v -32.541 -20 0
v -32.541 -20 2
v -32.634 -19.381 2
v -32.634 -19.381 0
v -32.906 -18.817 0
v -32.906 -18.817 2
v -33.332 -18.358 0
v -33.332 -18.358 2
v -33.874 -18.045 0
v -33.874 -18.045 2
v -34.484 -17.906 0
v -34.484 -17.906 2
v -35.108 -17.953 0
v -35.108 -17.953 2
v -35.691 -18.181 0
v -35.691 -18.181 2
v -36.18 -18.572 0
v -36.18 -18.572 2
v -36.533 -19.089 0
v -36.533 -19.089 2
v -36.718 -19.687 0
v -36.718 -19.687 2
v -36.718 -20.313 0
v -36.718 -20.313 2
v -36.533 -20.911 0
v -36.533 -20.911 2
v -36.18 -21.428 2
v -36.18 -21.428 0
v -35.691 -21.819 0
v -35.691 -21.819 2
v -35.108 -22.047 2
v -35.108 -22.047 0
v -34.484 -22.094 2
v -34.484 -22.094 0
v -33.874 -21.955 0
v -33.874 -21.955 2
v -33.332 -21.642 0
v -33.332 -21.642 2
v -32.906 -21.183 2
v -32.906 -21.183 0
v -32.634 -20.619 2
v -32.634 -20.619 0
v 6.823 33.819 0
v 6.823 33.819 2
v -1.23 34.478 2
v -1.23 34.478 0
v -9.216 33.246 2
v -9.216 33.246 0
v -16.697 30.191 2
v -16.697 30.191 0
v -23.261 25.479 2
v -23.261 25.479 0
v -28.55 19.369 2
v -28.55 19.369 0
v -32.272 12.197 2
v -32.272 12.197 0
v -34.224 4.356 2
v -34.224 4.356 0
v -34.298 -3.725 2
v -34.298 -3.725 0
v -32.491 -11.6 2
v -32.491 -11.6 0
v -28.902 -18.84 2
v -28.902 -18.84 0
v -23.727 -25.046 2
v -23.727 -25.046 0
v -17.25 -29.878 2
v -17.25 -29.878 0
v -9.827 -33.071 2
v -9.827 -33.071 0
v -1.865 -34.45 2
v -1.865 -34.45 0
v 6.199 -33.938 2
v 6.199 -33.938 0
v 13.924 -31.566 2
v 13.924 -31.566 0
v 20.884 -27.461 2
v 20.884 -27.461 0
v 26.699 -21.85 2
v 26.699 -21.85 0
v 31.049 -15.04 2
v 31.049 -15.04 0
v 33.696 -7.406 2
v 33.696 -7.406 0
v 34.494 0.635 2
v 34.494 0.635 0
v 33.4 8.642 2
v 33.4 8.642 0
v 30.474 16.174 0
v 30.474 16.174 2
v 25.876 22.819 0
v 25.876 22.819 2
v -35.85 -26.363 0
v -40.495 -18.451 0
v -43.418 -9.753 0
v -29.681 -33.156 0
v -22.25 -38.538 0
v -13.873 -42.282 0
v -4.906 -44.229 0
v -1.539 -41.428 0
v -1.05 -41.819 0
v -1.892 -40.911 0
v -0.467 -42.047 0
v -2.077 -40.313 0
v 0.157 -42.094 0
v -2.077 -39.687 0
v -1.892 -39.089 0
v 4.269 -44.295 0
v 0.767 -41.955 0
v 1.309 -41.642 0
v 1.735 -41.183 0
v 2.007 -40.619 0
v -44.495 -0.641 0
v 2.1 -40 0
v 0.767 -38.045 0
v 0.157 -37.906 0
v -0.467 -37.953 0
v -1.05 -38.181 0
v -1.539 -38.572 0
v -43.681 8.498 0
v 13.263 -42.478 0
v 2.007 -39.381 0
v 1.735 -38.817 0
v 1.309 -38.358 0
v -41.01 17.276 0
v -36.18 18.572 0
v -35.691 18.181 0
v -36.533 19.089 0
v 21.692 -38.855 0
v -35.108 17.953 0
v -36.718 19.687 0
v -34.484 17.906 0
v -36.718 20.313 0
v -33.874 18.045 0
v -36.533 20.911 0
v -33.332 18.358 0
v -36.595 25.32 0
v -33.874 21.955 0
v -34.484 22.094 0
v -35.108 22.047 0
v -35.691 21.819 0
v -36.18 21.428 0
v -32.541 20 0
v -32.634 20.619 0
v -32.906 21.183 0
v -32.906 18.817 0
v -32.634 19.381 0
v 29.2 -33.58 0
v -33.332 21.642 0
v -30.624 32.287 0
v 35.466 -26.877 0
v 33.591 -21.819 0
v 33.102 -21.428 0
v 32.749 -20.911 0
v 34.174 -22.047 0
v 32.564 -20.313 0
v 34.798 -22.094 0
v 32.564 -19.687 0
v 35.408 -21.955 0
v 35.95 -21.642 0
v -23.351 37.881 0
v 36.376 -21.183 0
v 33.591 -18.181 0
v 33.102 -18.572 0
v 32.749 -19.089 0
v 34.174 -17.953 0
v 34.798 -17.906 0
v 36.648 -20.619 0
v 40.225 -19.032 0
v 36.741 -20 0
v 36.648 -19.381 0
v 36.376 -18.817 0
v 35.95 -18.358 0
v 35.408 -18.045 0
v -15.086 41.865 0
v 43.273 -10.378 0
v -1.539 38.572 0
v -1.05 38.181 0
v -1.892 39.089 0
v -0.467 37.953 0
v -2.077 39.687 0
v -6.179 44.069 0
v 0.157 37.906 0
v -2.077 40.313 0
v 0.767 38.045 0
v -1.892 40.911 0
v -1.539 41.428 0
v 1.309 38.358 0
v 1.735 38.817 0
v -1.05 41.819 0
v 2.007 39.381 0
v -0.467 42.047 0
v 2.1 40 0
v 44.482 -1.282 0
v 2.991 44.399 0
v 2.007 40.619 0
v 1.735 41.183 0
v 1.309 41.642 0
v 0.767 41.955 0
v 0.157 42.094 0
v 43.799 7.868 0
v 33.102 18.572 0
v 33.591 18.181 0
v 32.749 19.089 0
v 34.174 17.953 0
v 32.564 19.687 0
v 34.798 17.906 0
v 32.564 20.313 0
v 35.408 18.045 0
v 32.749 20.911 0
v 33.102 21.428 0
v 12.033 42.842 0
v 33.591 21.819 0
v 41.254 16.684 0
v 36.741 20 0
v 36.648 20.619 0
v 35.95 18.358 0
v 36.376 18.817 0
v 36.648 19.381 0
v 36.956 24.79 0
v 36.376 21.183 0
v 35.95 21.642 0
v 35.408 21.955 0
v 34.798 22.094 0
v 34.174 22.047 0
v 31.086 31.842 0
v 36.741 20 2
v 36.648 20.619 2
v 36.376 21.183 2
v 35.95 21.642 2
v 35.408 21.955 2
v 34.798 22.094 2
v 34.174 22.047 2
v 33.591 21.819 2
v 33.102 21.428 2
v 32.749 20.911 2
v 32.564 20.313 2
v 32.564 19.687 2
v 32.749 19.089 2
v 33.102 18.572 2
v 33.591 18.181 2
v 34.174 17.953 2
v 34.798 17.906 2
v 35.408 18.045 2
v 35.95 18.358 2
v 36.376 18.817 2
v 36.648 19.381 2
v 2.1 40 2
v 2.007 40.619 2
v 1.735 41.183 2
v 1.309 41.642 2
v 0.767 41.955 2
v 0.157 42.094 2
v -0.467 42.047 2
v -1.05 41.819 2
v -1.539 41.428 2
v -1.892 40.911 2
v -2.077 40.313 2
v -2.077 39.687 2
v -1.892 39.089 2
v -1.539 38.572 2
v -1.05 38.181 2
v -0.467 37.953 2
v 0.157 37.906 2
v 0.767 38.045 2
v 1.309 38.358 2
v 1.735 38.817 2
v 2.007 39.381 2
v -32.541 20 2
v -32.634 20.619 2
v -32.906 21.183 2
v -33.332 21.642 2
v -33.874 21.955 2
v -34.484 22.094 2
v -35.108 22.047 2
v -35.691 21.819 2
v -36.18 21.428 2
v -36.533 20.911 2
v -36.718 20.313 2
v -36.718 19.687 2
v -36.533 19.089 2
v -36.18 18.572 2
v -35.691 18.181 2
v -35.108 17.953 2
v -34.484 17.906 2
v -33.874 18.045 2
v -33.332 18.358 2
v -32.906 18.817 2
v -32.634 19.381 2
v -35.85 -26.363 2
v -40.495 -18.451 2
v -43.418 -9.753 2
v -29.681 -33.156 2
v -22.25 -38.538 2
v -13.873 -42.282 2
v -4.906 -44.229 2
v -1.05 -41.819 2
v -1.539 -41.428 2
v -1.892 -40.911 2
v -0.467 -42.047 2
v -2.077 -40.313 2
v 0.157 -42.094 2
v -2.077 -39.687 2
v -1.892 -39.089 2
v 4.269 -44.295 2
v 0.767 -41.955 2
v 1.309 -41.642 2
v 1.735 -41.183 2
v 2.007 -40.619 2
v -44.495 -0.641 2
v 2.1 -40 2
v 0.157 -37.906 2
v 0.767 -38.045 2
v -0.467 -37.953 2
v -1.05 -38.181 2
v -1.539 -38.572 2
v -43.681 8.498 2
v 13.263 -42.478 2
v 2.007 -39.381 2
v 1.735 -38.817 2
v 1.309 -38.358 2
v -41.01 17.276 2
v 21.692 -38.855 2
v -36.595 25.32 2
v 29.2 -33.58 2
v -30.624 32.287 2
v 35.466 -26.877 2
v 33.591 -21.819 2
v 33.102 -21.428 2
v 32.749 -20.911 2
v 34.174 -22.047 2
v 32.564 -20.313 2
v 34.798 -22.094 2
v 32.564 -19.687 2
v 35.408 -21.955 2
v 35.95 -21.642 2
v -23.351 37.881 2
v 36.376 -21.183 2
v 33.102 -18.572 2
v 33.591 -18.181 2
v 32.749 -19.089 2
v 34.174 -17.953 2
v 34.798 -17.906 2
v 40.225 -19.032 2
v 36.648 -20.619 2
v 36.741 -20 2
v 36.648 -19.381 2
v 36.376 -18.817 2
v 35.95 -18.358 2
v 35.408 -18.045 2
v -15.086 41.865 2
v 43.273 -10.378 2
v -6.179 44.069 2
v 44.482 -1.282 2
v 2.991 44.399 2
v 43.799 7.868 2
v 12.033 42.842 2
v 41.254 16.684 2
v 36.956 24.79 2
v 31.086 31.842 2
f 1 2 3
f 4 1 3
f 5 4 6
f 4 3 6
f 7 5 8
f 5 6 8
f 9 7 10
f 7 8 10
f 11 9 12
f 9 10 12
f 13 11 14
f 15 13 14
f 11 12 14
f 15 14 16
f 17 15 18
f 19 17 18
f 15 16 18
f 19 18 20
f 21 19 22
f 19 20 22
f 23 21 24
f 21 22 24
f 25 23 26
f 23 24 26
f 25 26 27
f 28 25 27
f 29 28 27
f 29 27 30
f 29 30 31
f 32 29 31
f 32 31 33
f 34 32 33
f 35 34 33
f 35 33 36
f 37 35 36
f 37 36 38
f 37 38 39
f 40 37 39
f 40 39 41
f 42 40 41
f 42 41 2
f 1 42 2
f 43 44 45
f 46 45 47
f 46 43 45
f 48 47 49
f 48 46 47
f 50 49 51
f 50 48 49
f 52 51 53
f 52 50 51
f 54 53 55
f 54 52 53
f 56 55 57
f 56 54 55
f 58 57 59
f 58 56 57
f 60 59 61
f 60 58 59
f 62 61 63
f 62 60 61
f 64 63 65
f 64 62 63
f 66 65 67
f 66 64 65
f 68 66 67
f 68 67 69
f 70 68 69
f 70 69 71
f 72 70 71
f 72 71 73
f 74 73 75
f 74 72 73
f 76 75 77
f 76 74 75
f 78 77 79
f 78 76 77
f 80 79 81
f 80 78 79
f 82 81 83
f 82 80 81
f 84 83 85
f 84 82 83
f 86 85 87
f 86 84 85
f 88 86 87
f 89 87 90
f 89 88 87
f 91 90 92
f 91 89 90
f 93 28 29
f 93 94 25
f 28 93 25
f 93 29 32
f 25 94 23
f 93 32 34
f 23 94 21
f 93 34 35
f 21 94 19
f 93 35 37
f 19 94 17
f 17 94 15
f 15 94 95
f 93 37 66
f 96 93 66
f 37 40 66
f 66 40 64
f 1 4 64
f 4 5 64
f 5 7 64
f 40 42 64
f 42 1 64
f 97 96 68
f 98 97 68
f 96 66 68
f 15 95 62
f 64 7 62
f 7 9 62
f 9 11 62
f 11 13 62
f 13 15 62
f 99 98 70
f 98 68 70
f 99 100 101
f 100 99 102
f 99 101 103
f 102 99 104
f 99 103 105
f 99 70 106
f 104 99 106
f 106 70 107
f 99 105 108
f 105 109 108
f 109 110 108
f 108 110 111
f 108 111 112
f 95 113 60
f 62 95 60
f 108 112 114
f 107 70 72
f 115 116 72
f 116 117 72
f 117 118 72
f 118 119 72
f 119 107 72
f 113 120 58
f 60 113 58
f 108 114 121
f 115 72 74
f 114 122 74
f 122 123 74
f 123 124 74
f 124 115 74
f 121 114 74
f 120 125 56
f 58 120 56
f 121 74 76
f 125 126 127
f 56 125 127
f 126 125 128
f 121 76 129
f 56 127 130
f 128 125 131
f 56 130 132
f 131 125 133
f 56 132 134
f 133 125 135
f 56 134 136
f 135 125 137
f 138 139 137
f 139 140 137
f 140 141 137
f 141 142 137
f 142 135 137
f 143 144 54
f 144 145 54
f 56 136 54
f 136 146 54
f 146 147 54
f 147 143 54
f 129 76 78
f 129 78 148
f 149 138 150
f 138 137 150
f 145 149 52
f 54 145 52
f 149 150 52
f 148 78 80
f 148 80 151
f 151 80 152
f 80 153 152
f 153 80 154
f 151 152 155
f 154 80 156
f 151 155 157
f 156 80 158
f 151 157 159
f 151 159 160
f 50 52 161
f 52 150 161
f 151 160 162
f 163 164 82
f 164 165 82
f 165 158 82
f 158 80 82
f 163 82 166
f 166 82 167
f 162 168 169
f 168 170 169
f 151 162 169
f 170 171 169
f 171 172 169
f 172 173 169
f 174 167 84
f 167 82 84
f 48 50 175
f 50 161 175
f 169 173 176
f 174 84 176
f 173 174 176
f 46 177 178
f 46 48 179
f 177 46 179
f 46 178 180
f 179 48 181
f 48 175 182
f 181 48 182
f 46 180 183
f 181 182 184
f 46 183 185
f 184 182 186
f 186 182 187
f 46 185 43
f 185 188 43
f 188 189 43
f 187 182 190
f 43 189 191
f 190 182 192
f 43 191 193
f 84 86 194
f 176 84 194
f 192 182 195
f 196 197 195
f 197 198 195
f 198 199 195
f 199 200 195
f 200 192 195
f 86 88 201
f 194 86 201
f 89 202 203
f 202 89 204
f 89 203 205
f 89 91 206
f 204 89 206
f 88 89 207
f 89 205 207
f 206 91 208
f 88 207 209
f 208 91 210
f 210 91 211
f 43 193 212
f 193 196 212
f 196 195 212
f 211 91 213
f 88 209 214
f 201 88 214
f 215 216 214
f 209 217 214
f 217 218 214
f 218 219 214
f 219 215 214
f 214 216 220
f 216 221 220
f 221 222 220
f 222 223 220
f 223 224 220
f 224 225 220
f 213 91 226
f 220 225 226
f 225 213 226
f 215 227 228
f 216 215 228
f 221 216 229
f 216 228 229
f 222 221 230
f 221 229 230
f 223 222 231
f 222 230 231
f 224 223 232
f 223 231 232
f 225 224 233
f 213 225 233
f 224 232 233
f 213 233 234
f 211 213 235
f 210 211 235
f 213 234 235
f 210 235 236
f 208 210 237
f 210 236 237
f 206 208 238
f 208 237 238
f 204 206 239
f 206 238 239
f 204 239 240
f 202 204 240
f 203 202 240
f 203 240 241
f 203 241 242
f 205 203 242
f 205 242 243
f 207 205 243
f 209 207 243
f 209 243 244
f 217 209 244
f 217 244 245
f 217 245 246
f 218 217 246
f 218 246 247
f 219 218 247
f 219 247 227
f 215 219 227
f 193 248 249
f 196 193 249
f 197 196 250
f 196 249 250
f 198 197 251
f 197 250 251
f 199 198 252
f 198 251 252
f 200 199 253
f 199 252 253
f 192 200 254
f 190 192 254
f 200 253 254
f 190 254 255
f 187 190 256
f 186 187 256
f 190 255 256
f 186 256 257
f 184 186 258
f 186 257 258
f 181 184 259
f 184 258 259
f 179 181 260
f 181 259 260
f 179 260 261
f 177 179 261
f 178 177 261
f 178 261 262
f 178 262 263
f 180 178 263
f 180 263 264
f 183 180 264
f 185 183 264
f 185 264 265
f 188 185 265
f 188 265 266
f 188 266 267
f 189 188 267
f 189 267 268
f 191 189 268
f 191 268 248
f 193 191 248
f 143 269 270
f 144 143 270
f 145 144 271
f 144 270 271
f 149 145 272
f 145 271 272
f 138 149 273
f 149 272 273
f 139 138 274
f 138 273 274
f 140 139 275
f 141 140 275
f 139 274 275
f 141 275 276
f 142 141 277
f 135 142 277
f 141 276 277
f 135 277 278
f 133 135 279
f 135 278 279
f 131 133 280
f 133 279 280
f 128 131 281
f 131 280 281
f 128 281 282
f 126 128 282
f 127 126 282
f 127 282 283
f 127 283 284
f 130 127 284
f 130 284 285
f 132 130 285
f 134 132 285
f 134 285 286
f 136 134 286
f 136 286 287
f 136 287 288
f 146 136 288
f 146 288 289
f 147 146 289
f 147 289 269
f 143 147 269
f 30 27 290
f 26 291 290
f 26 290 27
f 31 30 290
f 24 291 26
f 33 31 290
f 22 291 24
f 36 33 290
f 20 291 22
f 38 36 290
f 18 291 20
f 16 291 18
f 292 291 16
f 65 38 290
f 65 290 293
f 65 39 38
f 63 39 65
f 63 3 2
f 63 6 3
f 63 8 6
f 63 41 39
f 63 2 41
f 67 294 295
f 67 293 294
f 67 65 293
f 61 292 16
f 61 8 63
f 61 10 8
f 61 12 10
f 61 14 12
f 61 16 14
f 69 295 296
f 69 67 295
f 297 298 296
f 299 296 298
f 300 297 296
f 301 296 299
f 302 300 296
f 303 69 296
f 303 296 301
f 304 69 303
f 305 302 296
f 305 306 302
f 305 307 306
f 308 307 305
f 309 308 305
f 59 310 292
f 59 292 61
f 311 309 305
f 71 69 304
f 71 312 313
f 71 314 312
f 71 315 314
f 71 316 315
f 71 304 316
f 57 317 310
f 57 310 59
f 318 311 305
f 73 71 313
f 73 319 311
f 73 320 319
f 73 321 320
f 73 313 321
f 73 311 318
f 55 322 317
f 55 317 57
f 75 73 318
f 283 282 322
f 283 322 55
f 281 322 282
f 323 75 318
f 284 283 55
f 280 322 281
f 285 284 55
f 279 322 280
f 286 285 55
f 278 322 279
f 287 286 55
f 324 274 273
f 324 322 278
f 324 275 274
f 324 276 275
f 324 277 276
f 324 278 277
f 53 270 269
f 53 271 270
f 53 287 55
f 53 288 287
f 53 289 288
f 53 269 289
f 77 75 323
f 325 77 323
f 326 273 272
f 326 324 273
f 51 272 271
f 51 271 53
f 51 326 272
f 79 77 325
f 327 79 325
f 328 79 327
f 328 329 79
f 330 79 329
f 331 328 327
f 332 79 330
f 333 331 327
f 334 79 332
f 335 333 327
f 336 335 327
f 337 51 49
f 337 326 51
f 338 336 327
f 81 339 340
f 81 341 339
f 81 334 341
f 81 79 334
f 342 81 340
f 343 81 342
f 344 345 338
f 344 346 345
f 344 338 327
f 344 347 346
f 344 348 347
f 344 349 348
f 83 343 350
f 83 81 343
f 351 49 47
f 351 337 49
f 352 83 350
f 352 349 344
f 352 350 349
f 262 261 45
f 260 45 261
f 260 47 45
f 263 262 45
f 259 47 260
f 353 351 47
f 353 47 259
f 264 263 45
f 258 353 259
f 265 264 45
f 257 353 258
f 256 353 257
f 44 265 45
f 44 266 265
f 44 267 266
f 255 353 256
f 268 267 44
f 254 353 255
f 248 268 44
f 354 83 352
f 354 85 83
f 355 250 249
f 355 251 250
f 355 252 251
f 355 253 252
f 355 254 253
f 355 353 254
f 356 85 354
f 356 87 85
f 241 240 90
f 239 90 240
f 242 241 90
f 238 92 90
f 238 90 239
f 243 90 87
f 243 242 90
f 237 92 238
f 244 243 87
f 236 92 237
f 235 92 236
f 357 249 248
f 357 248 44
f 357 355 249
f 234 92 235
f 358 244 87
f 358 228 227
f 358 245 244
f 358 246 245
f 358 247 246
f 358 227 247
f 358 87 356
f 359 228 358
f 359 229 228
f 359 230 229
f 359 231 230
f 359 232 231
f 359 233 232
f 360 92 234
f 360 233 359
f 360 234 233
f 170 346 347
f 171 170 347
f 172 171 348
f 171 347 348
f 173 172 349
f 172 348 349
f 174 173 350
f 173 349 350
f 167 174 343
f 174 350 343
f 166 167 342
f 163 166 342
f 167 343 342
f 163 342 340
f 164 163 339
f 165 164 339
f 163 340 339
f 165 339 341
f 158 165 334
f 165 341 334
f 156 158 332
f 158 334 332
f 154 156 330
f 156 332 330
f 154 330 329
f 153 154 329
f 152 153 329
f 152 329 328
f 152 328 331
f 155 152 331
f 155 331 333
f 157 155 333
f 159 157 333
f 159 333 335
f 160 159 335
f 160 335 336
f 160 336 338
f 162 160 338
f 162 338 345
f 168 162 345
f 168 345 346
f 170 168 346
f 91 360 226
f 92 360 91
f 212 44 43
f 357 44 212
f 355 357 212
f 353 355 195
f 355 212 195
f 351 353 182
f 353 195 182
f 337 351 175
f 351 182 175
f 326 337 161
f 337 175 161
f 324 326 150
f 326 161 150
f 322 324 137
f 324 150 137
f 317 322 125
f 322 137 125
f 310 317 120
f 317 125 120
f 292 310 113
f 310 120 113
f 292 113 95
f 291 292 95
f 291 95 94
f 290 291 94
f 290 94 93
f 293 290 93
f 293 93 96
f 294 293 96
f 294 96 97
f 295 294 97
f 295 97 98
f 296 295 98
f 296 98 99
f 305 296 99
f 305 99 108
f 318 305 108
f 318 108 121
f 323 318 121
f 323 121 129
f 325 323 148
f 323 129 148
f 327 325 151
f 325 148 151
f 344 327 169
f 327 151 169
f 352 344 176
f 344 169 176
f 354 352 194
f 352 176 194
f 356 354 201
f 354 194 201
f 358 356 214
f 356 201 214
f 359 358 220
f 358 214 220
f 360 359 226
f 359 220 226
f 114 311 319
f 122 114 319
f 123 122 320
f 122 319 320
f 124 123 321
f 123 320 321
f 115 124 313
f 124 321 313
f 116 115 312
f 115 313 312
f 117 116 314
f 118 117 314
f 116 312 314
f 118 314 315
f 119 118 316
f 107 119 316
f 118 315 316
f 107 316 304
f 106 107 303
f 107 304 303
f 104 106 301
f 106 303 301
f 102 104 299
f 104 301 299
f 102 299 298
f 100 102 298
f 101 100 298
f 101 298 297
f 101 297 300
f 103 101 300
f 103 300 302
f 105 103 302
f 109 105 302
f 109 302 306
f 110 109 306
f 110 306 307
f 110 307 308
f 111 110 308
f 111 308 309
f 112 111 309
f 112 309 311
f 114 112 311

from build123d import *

# Parameters (mm, degrees)
SKETCH_1_R          = 44.5
SKETCH_1_R_2        = 34.5
EXTRUDE_1_DEPTH     = 2
SKETCH_2_R          = 2.1
CUT_EXTRUDE_1_DEPTH = 26
CUT_EXTRUDE_2_DEPTH = 26


with BuildPart() as part:
    # 草图1 → 凸台-拉伸1 (new body)
    with BuildSketch(Plane.XY):
        Circle(SKETCH_1_R)
        Circle(SKETCH_1_R_2, mode=Mode.SUBTRACT)
    extrude(amount=EXTRUDE_1_DEPTH)

    # 草图2 → 切除-拉伸1 (cut)
    with BuildSketch(Plane.XY.offset(2)):
        with Locations((0, 40)):
            Circle(SKETCH_2_R)
        with Locations((34.641016151, 20)):
            Circle(SKETCH_2_R)
        with Locations((34.641016151, -20)):
            Circle(SKETCH_2_R)
        with Locations((0, -40)):
            Circle(SKETCH_2_R)
        with Locations((-34.641016151, -20)):
            Circle(SKETCH_2_R)
        with Locations((-34.641016151, 20)):
            Circle(SKETCH_2_R)
    extrude(amount=-CUT_EXTRUDE_1_DEPTH, mode=Mode.SUBTRACT)

    # 草图3 → 切除-拉伸2 (cut)
    with BuildSketch(Plane.XY.offset(2)):
        Polygon((-6.056039584, 11.510631748), (15.427420122, 48.721075481), (34.479979005, 37.721075481), (12.996519299, 0.510631748), align=None)
    extrude(amount=-CUT_EXTRUDE_2_DEPTH, mode=Mode.SUBTRACT)


solid = part.part
